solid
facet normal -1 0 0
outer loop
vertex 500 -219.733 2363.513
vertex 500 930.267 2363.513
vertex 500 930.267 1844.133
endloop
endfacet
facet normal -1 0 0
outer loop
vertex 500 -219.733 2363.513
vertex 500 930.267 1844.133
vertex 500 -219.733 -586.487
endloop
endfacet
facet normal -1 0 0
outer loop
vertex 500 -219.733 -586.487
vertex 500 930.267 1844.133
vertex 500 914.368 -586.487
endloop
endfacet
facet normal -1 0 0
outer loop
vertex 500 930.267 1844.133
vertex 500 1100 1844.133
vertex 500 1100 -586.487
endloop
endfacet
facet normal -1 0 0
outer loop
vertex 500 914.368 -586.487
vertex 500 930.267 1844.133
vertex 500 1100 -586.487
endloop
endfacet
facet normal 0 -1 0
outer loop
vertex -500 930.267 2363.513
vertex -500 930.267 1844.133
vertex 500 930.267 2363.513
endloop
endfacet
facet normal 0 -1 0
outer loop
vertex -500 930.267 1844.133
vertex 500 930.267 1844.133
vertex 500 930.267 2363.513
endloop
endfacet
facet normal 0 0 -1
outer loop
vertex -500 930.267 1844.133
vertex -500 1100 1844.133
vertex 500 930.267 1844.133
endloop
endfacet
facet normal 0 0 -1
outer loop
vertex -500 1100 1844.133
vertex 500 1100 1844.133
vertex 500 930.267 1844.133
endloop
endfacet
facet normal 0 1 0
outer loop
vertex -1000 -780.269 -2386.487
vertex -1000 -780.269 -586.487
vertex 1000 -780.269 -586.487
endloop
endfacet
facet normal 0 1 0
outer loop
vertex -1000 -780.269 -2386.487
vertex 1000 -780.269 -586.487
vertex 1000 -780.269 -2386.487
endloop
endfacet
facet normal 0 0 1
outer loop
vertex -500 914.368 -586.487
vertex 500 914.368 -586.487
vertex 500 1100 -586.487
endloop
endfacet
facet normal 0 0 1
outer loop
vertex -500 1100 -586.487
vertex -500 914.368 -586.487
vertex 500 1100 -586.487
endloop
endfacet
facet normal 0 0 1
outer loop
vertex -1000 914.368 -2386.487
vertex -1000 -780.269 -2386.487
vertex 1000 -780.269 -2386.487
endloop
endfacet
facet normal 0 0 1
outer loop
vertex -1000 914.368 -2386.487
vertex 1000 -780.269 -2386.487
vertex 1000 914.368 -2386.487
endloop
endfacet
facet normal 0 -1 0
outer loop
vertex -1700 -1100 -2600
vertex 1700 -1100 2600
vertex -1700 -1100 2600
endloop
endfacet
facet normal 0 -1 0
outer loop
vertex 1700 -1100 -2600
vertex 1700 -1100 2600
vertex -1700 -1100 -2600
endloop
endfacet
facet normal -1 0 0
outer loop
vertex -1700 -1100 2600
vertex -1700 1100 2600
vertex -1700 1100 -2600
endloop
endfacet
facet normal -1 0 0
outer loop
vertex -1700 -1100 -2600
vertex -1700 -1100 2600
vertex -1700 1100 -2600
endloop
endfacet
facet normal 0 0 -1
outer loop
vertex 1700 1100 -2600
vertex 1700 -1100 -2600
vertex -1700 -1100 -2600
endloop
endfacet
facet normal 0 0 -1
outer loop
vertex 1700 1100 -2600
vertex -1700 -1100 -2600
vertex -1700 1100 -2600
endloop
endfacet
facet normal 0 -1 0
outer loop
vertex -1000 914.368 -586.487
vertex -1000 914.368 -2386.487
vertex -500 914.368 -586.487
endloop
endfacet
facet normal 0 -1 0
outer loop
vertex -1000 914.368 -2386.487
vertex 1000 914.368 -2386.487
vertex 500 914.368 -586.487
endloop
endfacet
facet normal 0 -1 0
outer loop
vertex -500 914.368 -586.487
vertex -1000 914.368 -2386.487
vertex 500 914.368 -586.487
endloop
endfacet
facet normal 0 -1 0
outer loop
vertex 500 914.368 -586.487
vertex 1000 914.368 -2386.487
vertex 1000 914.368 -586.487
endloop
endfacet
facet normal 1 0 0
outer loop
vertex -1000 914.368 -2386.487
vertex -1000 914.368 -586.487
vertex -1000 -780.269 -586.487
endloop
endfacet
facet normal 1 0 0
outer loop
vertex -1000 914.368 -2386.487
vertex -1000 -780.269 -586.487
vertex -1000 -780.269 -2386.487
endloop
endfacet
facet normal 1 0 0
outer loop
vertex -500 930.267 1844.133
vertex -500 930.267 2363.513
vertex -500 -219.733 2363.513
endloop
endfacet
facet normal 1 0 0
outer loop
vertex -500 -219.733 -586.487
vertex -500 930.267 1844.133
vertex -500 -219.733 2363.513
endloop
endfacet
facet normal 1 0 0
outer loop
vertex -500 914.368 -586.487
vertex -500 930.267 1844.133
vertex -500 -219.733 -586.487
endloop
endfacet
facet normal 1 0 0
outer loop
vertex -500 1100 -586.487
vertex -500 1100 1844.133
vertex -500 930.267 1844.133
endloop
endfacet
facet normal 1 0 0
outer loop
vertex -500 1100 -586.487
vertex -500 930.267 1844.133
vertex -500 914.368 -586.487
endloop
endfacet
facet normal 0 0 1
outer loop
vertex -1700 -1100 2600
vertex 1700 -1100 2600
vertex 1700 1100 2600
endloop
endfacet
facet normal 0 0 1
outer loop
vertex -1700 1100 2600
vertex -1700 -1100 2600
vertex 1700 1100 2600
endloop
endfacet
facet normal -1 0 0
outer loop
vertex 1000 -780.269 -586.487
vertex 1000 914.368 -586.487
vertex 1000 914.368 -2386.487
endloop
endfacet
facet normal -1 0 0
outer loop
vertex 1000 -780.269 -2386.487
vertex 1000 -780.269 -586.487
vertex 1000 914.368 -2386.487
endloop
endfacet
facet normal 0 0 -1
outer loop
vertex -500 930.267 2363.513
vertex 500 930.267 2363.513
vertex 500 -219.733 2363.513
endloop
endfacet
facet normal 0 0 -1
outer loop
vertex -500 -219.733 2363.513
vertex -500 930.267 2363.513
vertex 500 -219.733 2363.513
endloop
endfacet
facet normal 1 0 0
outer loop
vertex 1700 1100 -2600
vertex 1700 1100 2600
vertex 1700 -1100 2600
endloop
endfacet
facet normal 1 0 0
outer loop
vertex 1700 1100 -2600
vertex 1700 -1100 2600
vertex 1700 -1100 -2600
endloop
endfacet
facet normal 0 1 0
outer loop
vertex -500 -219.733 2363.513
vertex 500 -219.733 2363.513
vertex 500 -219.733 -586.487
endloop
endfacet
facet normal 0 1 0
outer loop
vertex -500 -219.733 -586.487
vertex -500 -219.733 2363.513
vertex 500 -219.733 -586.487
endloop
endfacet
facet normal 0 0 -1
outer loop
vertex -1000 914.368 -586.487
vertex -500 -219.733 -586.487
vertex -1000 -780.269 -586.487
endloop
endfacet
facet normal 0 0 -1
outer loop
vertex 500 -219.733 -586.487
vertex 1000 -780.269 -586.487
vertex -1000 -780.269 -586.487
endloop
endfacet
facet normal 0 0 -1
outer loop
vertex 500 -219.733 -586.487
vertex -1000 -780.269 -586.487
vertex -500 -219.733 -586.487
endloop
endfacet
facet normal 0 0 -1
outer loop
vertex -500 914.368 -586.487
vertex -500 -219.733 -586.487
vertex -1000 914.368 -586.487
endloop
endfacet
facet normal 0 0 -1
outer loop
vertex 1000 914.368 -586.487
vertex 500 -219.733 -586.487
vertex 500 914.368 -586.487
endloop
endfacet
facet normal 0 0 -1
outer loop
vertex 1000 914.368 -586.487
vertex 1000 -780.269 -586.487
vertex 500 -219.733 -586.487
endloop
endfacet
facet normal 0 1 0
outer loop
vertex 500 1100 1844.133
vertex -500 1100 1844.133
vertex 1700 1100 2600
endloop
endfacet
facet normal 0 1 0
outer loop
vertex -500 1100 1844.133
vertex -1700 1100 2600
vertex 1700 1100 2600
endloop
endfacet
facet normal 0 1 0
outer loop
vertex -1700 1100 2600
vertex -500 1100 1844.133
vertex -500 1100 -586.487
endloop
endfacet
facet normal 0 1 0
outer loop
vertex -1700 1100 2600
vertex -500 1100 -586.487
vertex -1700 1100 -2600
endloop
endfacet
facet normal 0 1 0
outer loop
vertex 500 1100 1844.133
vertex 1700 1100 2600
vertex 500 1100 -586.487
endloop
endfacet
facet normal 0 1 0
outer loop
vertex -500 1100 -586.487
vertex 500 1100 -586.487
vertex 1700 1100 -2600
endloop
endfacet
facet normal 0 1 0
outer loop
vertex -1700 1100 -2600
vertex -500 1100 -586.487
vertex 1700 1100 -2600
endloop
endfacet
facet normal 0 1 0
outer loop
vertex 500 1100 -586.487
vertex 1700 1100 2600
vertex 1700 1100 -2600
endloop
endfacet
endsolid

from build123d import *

# Parameters (mm, degrees)
SKETCH_1_W          = 5200
SKETCH_1_H          = 2200
EXTRUDE_1_DEPTH     = 1700
CUT_EXTRUDE_1_DEPTH = 500
SKETCH_4_W          = 1800
SKETCH_4_H          = 1694.637135117
CUT_EXTRUDE_2_DEPTH = 1000


with BuildPart() as part:
    # Эскиз1 → Бобышка-Вытянуть1 (new body, symmetric)
    with BuildSketch(Plane(origin=(0, 0, 0), x_dir=(0, 0, -1), z_dir=(1, 0, 0))):
        Rectangle(SKETCH_1_W, SKETCH_1_H)
    extrude(amount=EXTRUDE_1_DEPTH, both=True)

    # Эскиз3 → Вырез-Вытянуть1 (cut, symmetric)
    with BuildSketch(Plane(origin=(0, 0, 0), x_dir=(0, 0, -1), z_dir=(1, 0, 0))):
        Polygon((-1844.132537204, 930.267244324), (-2363.513442227, 930.267244324), (-2363.513442227, -219.732755676), (586.486557773, -219.732755676), (586.486557773, -780.268672554), (2386.486557773, -780.268672554), (2386.486557773, 914.368462563), (586.486557773, 914.368462563), (586.486557773, 1100), (-1844.132537204, 1100), align=None)
    extrude(amount=CUT_EXTRUDE_1_DEPTH, both=True, mode=Mode.SUBTRACT)

    # Эскиз4 → Вырез-Вытянуть2 (cut, symmetric)
    with BuildSketch(Plane(origin=(0, 0, 0), x_dir=(0, 0, -1), z_dir=(1, 0, 0))):
        with Locations((1486.486557773, 67.049895005)):
            Rectangle(SKETCH_4_W, SKETCH_4_H)
    extrude(amount=CUT_EXTRUDE_2_DEPTH, both=True, mode=Mode.SUBTRACT)


solid = part.part
